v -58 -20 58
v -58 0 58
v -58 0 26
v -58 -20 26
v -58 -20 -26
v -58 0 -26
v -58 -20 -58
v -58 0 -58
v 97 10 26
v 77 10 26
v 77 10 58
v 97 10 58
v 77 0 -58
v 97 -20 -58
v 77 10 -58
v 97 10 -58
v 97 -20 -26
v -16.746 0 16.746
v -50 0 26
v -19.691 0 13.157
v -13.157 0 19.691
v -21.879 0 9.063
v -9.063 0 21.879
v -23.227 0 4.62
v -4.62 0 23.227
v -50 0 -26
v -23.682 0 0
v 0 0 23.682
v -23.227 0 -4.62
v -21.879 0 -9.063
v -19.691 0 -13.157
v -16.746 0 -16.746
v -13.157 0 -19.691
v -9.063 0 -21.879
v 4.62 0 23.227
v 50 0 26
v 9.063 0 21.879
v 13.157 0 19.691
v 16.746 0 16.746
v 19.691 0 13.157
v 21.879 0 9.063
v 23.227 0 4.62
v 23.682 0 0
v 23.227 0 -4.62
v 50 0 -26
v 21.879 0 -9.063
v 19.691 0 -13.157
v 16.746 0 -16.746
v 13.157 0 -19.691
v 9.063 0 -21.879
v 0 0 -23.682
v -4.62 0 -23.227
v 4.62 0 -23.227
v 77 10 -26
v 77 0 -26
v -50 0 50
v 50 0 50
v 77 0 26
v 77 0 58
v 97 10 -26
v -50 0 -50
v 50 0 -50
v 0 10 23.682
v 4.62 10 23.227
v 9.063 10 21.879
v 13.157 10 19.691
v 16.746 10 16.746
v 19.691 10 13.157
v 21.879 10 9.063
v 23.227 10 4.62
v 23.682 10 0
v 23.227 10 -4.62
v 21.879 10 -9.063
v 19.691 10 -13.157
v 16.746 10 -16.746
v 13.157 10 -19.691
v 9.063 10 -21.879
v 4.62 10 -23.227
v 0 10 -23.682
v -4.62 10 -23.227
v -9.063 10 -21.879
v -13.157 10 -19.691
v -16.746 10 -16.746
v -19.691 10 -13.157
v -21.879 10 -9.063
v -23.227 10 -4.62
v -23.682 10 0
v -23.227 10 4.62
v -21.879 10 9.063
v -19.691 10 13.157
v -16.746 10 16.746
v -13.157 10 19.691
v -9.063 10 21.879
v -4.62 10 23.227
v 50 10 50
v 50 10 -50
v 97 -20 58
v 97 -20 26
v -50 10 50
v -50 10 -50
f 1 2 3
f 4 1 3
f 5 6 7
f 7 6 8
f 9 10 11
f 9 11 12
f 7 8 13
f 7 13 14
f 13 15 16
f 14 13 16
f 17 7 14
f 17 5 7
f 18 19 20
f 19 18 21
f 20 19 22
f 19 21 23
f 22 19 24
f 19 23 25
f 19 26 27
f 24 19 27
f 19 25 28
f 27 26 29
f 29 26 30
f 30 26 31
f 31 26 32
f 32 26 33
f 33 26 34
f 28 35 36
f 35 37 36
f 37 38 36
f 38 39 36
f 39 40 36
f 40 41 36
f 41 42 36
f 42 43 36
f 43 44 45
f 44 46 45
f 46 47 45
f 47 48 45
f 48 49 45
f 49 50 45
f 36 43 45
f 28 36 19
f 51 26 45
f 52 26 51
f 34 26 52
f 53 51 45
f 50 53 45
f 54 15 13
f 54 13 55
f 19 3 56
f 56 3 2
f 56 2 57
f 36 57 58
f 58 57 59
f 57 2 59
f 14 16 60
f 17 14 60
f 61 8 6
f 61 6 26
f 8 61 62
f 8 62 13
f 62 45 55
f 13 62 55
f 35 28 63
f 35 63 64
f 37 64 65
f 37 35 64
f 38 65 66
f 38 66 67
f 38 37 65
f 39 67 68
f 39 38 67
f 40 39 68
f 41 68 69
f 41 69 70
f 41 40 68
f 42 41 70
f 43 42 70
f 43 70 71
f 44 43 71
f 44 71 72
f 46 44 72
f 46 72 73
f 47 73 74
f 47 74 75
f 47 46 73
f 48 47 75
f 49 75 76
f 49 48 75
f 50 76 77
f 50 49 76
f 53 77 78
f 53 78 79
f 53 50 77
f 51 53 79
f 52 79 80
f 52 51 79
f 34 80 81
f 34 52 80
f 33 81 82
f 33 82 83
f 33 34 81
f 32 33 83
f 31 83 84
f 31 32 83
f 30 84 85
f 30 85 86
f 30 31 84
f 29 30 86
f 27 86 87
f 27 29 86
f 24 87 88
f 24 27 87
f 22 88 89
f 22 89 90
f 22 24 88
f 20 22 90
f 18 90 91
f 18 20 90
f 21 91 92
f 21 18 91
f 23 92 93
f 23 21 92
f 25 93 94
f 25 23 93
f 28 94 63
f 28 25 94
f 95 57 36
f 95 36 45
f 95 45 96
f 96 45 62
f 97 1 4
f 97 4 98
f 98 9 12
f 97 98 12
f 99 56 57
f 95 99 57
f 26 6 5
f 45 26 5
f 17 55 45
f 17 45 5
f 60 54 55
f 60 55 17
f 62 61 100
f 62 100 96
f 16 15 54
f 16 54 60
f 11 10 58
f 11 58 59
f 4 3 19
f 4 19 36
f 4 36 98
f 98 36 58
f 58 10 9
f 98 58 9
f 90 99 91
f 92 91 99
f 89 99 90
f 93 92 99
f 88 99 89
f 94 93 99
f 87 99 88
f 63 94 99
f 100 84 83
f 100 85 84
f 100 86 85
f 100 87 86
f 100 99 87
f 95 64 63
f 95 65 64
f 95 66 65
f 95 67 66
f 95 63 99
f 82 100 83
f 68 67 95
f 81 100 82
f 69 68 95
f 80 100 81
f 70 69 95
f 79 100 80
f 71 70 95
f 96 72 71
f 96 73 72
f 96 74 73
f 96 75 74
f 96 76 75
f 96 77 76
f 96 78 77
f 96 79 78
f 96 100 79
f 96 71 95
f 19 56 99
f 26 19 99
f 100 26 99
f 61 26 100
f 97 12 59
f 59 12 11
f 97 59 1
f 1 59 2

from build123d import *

# Parameters (mm, degrees)
SKETCH1_W                = 100
SKETCH1_H                = 100
SKETCH1_R                = 23.682087014
BOSS_EXTRUDE1_DEPTH      = 10
SKETCH2_W                = 135
SKETCH2_H                = 32
BOSS_EXTRUDE2_DEPTH      = 20
BOSS_EXTRUDE3_DEPTH      = 20
BOSS_EXTRUDE3_DEPTH_BACK = 10
SKETCH2_3_W              = 20
SKETCH2_3_H              = 32


with BuildPart() as part:
    # Sketch1 → Boss-Extrude1 (new body)
    with BuildSketch(Plane(origin=(0, 0, 0), x_dir=(1, 0, 0), z_dir=(0, 1, 0))):
        Rectangle(SKETCH1_W, SKETCH1_H)
        Circle(SKETCH1_R, mode=Mode.SUBTRACT)
    extrude(amount=BOSS_EXTRUDE1_DEPTH)

    # Sketch2 → Boss-Extrude2 (add)
    with BuildSketch(Plane.XZ):
        with Locations((9.5, 42)):
            Rectangle(SKETCH2_W, SKETCH2_H)
        with Locations((9.5, -42)):
            Rectangle(SKETCH2_W, SKETCH2_H)
    extrude(amount=BOSS_EXTRUDE2_DEPTH)

    # Sketch2<3> → Boss-Extrude3 (add, two sides: drawn at the far end of the back side and taken through both)
    with BuildSketch(Plane.XZ.offset(-BOSS_EXTRUDE3_DEPTH_BACK)):
        with Locations((87, 42)):
            Rectangle(SKETCH2_3_W, SKETCH2_3_H)
        with Locations((87, -42)):
            Rectangle(SKETCH2_3_W, SKETCH2_3_H)
    extrude(amount=BOSS_EXTRUDE3_DEPTH + BOSS_EXTRUDE3_DEPTH_BACK)


solid = part.part
